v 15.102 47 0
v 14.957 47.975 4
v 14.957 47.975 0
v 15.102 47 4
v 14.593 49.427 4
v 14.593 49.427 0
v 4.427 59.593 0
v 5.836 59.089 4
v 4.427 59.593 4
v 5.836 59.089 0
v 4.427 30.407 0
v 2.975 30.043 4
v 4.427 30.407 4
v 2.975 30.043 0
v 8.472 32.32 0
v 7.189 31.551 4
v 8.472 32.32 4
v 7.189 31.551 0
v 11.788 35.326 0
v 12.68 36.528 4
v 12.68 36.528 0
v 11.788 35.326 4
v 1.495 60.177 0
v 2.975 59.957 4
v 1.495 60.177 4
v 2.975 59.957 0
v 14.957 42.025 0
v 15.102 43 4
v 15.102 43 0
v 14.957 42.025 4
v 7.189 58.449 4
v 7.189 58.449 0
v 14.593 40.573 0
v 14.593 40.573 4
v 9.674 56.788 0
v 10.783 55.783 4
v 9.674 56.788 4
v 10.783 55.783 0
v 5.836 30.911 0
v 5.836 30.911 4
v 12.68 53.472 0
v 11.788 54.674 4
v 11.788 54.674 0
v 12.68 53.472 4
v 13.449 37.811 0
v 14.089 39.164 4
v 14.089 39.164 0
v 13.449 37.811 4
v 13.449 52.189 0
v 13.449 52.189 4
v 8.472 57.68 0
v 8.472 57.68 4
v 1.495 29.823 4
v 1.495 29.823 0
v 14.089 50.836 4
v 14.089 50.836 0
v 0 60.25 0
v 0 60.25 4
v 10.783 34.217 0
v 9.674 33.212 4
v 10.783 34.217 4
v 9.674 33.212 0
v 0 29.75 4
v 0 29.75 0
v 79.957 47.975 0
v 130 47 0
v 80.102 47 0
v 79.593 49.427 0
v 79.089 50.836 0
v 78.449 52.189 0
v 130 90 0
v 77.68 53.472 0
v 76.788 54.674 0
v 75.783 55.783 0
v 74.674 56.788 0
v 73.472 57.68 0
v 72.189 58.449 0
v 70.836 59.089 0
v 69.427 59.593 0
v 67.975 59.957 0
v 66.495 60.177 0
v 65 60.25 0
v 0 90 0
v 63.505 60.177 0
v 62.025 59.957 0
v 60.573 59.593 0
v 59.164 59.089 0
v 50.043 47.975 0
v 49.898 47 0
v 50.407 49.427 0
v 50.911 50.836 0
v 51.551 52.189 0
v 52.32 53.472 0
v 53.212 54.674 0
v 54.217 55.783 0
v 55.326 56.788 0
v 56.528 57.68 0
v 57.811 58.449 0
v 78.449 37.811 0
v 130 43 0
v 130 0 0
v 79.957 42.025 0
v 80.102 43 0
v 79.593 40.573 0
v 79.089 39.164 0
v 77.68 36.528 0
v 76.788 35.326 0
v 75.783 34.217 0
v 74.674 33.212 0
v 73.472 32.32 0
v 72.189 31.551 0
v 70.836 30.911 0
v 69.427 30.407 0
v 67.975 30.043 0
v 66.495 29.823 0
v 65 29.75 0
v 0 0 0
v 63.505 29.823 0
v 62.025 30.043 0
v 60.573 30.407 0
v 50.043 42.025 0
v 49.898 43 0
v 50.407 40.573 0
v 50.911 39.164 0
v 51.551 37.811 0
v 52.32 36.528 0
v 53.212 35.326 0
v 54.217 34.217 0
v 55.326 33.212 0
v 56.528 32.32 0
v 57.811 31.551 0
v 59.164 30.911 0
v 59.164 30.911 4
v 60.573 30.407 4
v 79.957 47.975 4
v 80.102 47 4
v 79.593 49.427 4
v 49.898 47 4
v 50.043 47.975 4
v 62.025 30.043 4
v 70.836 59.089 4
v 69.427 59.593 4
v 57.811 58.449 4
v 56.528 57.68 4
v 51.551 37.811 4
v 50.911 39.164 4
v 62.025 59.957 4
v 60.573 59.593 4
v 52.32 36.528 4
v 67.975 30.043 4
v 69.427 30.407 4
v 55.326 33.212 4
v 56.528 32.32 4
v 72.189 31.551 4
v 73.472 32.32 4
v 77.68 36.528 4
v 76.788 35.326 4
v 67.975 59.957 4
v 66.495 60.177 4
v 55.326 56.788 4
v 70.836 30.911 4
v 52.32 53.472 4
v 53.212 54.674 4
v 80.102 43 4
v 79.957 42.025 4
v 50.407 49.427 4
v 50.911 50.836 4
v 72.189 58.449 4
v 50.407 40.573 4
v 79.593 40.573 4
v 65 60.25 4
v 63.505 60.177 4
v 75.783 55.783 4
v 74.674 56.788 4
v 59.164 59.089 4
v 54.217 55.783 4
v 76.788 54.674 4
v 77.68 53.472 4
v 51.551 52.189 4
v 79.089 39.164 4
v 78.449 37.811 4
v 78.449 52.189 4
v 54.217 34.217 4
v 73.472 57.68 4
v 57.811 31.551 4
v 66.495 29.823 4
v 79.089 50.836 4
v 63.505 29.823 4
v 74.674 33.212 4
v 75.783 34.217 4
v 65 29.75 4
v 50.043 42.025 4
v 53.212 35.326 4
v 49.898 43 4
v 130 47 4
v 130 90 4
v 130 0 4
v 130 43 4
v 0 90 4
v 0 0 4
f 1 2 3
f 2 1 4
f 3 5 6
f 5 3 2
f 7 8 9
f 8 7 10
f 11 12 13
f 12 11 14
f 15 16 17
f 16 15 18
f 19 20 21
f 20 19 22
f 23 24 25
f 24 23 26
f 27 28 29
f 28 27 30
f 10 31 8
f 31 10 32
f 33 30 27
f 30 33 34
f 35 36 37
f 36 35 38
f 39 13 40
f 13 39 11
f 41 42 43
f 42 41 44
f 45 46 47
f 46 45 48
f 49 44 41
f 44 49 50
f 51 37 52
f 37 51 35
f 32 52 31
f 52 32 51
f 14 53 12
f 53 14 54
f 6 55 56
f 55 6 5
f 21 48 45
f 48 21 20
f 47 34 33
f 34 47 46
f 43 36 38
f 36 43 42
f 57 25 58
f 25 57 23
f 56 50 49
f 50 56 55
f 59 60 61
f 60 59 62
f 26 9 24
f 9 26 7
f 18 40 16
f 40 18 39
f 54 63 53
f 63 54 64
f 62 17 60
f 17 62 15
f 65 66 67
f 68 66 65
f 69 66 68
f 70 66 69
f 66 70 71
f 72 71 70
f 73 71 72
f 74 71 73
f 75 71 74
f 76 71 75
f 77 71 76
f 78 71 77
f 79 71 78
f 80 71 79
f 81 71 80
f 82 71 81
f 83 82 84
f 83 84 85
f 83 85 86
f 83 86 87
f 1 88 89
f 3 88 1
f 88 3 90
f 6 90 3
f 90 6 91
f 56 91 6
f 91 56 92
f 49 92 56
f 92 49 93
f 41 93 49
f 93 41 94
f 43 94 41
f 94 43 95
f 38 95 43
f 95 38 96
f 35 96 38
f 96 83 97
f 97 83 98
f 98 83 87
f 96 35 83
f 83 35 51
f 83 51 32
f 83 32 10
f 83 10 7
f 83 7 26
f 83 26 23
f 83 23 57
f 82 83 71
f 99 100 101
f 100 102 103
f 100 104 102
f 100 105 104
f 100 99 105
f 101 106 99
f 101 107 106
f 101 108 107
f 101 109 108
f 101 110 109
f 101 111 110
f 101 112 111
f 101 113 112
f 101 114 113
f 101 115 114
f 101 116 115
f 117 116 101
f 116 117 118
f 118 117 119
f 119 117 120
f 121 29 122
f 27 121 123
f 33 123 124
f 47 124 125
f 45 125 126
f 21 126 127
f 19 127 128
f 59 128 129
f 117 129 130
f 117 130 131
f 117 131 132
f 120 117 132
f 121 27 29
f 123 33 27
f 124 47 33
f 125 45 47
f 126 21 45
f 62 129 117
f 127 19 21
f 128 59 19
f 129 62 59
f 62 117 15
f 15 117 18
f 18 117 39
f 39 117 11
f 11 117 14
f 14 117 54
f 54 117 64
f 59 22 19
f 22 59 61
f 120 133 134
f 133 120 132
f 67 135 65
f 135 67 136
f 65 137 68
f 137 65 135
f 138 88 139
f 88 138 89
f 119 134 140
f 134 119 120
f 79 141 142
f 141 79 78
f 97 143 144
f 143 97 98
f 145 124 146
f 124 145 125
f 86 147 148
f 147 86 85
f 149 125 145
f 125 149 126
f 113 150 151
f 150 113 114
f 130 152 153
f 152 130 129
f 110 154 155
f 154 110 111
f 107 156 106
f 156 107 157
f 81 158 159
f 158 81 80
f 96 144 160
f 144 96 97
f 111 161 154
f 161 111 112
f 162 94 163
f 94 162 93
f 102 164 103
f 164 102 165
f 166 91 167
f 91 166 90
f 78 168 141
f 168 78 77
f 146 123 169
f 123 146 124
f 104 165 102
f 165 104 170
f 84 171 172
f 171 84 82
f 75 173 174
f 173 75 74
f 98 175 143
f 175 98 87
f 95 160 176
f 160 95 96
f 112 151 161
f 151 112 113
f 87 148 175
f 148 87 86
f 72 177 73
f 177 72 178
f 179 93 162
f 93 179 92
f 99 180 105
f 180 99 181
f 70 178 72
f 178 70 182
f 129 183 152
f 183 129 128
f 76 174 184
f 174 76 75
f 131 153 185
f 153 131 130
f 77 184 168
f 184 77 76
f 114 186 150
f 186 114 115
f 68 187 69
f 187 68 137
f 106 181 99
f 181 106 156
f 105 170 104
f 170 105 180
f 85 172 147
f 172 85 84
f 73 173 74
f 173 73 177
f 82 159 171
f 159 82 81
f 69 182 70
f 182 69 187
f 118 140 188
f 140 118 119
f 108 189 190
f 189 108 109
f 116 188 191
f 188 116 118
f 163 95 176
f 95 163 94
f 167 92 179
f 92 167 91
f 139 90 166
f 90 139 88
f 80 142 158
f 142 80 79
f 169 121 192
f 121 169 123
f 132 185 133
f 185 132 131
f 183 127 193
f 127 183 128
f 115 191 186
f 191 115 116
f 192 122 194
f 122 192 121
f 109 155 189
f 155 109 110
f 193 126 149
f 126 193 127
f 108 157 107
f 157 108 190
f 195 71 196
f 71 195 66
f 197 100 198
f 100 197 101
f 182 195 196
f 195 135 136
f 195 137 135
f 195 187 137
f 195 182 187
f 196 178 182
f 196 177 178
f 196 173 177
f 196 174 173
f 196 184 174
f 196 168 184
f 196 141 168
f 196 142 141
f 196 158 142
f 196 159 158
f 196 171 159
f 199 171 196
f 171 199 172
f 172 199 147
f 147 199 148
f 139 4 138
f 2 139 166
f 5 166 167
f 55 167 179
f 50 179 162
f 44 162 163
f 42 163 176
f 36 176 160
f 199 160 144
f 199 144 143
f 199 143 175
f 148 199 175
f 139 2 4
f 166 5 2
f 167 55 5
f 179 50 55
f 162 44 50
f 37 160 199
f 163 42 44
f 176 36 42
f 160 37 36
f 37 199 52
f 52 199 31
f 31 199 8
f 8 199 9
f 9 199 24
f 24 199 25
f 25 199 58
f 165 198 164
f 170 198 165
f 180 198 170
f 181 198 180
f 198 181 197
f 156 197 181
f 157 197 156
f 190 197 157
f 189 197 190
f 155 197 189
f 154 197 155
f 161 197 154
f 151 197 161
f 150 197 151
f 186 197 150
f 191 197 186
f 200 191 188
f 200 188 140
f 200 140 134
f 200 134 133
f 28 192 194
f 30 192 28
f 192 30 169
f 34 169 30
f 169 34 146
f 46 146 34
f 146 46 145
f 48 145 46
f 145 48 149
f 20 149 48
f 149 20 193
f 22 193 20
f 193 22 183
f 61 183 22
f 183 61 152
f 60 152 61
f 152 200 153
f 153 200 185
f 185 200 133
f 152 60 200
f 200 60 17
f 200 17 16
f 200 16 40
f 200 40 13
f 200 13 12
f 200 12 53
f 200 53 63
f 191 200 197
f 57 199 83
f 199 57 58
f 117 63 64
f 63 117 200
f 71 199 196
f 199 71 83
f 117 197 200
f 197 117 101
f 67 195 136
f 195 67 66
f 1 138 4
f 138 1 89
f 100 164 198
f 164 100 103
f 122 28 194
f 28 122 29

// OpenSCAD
// Rack for six 50 mL conical (Falcon-type) tubes
// Print orientation: Upside down (walls up, holes in plate).
// After printing, flip over to stand on walls.

// --- Dimensions ---
// Plate dimensions
$plate_length = 130; // X
$plate_width = 90;   // Y
$plate_thickness = 4; // Z

// Hole specifications
$hole_diameter = 30.5;
$hole_count_x = 3;
$hole_count_y = 2;
$hole_spacing_x = 40; // Centre-to-centre
$hole_spacing_y = 40; // Centre-to-centre

// Wall specifications
$wall_length = 130;   // X
$wall_thickness = 4;  // Y
$wall_height = 70;    // Z (total height from bed)

// --- Configuration ---
$fn = 64; // Smooth curves for holes

// --- Helper: Calculate hole positions ---
// The plate is centred on the origin.
// X positions: -65, 0, 65 (since length is 130 and spacing is 40)
// Y positions: -45, 45 (since width is 90 and spacing is 40)
hole_positions = [
    [-65, -45],
    [0, -45],
    [65, -45],
    [-65, 45],
    [0, 45],
    [65, 45]
];

// --- Main Build ---
difference() {
    // 1. The Base Plate
    // Lies on Z=0 to Z=4
    translate([0, 0, 0])
    cube([
        $plate_length,
        $plate_width,
        $plate_thickness
    ]);

    // 2. The Two Side Walls
    // They rise from the plate (Z=4) to Z=70.
    // They are flush with the long edges (Y = +/- $plate_width/2).
    // Wall thickness is in Y direction.
    
    // Left Wall (at Y = -45)
    translate([0, -$plate_width/2 - $wall_thickness/2, 0])
    cube([
        $wall_length,
        $wall_thickness,
        $wall_height
    ]);

    // Right Wall (at Y = +45)
    translate([0, $plate_width/2 - $wall_thickness/2, 0])
    cube([
        $wall_length,
        $wall_thickness,
        $wall_height
    ]);

    // 3. Cut the Holes
    // We cut through the entire assembly (plate + walls) to ensure tubes pass through.
    // We extend the cut slightly past the top of the walls to ensure clean removal.
    $cut_extension = 1; 
    
    for (pos = hole_positions) {
        translate(pos)
        cylinder(
            h = $wall_height + $cut_extension,
            d = $hole_diameter,
            $fn = $fn
        );
    }
}
